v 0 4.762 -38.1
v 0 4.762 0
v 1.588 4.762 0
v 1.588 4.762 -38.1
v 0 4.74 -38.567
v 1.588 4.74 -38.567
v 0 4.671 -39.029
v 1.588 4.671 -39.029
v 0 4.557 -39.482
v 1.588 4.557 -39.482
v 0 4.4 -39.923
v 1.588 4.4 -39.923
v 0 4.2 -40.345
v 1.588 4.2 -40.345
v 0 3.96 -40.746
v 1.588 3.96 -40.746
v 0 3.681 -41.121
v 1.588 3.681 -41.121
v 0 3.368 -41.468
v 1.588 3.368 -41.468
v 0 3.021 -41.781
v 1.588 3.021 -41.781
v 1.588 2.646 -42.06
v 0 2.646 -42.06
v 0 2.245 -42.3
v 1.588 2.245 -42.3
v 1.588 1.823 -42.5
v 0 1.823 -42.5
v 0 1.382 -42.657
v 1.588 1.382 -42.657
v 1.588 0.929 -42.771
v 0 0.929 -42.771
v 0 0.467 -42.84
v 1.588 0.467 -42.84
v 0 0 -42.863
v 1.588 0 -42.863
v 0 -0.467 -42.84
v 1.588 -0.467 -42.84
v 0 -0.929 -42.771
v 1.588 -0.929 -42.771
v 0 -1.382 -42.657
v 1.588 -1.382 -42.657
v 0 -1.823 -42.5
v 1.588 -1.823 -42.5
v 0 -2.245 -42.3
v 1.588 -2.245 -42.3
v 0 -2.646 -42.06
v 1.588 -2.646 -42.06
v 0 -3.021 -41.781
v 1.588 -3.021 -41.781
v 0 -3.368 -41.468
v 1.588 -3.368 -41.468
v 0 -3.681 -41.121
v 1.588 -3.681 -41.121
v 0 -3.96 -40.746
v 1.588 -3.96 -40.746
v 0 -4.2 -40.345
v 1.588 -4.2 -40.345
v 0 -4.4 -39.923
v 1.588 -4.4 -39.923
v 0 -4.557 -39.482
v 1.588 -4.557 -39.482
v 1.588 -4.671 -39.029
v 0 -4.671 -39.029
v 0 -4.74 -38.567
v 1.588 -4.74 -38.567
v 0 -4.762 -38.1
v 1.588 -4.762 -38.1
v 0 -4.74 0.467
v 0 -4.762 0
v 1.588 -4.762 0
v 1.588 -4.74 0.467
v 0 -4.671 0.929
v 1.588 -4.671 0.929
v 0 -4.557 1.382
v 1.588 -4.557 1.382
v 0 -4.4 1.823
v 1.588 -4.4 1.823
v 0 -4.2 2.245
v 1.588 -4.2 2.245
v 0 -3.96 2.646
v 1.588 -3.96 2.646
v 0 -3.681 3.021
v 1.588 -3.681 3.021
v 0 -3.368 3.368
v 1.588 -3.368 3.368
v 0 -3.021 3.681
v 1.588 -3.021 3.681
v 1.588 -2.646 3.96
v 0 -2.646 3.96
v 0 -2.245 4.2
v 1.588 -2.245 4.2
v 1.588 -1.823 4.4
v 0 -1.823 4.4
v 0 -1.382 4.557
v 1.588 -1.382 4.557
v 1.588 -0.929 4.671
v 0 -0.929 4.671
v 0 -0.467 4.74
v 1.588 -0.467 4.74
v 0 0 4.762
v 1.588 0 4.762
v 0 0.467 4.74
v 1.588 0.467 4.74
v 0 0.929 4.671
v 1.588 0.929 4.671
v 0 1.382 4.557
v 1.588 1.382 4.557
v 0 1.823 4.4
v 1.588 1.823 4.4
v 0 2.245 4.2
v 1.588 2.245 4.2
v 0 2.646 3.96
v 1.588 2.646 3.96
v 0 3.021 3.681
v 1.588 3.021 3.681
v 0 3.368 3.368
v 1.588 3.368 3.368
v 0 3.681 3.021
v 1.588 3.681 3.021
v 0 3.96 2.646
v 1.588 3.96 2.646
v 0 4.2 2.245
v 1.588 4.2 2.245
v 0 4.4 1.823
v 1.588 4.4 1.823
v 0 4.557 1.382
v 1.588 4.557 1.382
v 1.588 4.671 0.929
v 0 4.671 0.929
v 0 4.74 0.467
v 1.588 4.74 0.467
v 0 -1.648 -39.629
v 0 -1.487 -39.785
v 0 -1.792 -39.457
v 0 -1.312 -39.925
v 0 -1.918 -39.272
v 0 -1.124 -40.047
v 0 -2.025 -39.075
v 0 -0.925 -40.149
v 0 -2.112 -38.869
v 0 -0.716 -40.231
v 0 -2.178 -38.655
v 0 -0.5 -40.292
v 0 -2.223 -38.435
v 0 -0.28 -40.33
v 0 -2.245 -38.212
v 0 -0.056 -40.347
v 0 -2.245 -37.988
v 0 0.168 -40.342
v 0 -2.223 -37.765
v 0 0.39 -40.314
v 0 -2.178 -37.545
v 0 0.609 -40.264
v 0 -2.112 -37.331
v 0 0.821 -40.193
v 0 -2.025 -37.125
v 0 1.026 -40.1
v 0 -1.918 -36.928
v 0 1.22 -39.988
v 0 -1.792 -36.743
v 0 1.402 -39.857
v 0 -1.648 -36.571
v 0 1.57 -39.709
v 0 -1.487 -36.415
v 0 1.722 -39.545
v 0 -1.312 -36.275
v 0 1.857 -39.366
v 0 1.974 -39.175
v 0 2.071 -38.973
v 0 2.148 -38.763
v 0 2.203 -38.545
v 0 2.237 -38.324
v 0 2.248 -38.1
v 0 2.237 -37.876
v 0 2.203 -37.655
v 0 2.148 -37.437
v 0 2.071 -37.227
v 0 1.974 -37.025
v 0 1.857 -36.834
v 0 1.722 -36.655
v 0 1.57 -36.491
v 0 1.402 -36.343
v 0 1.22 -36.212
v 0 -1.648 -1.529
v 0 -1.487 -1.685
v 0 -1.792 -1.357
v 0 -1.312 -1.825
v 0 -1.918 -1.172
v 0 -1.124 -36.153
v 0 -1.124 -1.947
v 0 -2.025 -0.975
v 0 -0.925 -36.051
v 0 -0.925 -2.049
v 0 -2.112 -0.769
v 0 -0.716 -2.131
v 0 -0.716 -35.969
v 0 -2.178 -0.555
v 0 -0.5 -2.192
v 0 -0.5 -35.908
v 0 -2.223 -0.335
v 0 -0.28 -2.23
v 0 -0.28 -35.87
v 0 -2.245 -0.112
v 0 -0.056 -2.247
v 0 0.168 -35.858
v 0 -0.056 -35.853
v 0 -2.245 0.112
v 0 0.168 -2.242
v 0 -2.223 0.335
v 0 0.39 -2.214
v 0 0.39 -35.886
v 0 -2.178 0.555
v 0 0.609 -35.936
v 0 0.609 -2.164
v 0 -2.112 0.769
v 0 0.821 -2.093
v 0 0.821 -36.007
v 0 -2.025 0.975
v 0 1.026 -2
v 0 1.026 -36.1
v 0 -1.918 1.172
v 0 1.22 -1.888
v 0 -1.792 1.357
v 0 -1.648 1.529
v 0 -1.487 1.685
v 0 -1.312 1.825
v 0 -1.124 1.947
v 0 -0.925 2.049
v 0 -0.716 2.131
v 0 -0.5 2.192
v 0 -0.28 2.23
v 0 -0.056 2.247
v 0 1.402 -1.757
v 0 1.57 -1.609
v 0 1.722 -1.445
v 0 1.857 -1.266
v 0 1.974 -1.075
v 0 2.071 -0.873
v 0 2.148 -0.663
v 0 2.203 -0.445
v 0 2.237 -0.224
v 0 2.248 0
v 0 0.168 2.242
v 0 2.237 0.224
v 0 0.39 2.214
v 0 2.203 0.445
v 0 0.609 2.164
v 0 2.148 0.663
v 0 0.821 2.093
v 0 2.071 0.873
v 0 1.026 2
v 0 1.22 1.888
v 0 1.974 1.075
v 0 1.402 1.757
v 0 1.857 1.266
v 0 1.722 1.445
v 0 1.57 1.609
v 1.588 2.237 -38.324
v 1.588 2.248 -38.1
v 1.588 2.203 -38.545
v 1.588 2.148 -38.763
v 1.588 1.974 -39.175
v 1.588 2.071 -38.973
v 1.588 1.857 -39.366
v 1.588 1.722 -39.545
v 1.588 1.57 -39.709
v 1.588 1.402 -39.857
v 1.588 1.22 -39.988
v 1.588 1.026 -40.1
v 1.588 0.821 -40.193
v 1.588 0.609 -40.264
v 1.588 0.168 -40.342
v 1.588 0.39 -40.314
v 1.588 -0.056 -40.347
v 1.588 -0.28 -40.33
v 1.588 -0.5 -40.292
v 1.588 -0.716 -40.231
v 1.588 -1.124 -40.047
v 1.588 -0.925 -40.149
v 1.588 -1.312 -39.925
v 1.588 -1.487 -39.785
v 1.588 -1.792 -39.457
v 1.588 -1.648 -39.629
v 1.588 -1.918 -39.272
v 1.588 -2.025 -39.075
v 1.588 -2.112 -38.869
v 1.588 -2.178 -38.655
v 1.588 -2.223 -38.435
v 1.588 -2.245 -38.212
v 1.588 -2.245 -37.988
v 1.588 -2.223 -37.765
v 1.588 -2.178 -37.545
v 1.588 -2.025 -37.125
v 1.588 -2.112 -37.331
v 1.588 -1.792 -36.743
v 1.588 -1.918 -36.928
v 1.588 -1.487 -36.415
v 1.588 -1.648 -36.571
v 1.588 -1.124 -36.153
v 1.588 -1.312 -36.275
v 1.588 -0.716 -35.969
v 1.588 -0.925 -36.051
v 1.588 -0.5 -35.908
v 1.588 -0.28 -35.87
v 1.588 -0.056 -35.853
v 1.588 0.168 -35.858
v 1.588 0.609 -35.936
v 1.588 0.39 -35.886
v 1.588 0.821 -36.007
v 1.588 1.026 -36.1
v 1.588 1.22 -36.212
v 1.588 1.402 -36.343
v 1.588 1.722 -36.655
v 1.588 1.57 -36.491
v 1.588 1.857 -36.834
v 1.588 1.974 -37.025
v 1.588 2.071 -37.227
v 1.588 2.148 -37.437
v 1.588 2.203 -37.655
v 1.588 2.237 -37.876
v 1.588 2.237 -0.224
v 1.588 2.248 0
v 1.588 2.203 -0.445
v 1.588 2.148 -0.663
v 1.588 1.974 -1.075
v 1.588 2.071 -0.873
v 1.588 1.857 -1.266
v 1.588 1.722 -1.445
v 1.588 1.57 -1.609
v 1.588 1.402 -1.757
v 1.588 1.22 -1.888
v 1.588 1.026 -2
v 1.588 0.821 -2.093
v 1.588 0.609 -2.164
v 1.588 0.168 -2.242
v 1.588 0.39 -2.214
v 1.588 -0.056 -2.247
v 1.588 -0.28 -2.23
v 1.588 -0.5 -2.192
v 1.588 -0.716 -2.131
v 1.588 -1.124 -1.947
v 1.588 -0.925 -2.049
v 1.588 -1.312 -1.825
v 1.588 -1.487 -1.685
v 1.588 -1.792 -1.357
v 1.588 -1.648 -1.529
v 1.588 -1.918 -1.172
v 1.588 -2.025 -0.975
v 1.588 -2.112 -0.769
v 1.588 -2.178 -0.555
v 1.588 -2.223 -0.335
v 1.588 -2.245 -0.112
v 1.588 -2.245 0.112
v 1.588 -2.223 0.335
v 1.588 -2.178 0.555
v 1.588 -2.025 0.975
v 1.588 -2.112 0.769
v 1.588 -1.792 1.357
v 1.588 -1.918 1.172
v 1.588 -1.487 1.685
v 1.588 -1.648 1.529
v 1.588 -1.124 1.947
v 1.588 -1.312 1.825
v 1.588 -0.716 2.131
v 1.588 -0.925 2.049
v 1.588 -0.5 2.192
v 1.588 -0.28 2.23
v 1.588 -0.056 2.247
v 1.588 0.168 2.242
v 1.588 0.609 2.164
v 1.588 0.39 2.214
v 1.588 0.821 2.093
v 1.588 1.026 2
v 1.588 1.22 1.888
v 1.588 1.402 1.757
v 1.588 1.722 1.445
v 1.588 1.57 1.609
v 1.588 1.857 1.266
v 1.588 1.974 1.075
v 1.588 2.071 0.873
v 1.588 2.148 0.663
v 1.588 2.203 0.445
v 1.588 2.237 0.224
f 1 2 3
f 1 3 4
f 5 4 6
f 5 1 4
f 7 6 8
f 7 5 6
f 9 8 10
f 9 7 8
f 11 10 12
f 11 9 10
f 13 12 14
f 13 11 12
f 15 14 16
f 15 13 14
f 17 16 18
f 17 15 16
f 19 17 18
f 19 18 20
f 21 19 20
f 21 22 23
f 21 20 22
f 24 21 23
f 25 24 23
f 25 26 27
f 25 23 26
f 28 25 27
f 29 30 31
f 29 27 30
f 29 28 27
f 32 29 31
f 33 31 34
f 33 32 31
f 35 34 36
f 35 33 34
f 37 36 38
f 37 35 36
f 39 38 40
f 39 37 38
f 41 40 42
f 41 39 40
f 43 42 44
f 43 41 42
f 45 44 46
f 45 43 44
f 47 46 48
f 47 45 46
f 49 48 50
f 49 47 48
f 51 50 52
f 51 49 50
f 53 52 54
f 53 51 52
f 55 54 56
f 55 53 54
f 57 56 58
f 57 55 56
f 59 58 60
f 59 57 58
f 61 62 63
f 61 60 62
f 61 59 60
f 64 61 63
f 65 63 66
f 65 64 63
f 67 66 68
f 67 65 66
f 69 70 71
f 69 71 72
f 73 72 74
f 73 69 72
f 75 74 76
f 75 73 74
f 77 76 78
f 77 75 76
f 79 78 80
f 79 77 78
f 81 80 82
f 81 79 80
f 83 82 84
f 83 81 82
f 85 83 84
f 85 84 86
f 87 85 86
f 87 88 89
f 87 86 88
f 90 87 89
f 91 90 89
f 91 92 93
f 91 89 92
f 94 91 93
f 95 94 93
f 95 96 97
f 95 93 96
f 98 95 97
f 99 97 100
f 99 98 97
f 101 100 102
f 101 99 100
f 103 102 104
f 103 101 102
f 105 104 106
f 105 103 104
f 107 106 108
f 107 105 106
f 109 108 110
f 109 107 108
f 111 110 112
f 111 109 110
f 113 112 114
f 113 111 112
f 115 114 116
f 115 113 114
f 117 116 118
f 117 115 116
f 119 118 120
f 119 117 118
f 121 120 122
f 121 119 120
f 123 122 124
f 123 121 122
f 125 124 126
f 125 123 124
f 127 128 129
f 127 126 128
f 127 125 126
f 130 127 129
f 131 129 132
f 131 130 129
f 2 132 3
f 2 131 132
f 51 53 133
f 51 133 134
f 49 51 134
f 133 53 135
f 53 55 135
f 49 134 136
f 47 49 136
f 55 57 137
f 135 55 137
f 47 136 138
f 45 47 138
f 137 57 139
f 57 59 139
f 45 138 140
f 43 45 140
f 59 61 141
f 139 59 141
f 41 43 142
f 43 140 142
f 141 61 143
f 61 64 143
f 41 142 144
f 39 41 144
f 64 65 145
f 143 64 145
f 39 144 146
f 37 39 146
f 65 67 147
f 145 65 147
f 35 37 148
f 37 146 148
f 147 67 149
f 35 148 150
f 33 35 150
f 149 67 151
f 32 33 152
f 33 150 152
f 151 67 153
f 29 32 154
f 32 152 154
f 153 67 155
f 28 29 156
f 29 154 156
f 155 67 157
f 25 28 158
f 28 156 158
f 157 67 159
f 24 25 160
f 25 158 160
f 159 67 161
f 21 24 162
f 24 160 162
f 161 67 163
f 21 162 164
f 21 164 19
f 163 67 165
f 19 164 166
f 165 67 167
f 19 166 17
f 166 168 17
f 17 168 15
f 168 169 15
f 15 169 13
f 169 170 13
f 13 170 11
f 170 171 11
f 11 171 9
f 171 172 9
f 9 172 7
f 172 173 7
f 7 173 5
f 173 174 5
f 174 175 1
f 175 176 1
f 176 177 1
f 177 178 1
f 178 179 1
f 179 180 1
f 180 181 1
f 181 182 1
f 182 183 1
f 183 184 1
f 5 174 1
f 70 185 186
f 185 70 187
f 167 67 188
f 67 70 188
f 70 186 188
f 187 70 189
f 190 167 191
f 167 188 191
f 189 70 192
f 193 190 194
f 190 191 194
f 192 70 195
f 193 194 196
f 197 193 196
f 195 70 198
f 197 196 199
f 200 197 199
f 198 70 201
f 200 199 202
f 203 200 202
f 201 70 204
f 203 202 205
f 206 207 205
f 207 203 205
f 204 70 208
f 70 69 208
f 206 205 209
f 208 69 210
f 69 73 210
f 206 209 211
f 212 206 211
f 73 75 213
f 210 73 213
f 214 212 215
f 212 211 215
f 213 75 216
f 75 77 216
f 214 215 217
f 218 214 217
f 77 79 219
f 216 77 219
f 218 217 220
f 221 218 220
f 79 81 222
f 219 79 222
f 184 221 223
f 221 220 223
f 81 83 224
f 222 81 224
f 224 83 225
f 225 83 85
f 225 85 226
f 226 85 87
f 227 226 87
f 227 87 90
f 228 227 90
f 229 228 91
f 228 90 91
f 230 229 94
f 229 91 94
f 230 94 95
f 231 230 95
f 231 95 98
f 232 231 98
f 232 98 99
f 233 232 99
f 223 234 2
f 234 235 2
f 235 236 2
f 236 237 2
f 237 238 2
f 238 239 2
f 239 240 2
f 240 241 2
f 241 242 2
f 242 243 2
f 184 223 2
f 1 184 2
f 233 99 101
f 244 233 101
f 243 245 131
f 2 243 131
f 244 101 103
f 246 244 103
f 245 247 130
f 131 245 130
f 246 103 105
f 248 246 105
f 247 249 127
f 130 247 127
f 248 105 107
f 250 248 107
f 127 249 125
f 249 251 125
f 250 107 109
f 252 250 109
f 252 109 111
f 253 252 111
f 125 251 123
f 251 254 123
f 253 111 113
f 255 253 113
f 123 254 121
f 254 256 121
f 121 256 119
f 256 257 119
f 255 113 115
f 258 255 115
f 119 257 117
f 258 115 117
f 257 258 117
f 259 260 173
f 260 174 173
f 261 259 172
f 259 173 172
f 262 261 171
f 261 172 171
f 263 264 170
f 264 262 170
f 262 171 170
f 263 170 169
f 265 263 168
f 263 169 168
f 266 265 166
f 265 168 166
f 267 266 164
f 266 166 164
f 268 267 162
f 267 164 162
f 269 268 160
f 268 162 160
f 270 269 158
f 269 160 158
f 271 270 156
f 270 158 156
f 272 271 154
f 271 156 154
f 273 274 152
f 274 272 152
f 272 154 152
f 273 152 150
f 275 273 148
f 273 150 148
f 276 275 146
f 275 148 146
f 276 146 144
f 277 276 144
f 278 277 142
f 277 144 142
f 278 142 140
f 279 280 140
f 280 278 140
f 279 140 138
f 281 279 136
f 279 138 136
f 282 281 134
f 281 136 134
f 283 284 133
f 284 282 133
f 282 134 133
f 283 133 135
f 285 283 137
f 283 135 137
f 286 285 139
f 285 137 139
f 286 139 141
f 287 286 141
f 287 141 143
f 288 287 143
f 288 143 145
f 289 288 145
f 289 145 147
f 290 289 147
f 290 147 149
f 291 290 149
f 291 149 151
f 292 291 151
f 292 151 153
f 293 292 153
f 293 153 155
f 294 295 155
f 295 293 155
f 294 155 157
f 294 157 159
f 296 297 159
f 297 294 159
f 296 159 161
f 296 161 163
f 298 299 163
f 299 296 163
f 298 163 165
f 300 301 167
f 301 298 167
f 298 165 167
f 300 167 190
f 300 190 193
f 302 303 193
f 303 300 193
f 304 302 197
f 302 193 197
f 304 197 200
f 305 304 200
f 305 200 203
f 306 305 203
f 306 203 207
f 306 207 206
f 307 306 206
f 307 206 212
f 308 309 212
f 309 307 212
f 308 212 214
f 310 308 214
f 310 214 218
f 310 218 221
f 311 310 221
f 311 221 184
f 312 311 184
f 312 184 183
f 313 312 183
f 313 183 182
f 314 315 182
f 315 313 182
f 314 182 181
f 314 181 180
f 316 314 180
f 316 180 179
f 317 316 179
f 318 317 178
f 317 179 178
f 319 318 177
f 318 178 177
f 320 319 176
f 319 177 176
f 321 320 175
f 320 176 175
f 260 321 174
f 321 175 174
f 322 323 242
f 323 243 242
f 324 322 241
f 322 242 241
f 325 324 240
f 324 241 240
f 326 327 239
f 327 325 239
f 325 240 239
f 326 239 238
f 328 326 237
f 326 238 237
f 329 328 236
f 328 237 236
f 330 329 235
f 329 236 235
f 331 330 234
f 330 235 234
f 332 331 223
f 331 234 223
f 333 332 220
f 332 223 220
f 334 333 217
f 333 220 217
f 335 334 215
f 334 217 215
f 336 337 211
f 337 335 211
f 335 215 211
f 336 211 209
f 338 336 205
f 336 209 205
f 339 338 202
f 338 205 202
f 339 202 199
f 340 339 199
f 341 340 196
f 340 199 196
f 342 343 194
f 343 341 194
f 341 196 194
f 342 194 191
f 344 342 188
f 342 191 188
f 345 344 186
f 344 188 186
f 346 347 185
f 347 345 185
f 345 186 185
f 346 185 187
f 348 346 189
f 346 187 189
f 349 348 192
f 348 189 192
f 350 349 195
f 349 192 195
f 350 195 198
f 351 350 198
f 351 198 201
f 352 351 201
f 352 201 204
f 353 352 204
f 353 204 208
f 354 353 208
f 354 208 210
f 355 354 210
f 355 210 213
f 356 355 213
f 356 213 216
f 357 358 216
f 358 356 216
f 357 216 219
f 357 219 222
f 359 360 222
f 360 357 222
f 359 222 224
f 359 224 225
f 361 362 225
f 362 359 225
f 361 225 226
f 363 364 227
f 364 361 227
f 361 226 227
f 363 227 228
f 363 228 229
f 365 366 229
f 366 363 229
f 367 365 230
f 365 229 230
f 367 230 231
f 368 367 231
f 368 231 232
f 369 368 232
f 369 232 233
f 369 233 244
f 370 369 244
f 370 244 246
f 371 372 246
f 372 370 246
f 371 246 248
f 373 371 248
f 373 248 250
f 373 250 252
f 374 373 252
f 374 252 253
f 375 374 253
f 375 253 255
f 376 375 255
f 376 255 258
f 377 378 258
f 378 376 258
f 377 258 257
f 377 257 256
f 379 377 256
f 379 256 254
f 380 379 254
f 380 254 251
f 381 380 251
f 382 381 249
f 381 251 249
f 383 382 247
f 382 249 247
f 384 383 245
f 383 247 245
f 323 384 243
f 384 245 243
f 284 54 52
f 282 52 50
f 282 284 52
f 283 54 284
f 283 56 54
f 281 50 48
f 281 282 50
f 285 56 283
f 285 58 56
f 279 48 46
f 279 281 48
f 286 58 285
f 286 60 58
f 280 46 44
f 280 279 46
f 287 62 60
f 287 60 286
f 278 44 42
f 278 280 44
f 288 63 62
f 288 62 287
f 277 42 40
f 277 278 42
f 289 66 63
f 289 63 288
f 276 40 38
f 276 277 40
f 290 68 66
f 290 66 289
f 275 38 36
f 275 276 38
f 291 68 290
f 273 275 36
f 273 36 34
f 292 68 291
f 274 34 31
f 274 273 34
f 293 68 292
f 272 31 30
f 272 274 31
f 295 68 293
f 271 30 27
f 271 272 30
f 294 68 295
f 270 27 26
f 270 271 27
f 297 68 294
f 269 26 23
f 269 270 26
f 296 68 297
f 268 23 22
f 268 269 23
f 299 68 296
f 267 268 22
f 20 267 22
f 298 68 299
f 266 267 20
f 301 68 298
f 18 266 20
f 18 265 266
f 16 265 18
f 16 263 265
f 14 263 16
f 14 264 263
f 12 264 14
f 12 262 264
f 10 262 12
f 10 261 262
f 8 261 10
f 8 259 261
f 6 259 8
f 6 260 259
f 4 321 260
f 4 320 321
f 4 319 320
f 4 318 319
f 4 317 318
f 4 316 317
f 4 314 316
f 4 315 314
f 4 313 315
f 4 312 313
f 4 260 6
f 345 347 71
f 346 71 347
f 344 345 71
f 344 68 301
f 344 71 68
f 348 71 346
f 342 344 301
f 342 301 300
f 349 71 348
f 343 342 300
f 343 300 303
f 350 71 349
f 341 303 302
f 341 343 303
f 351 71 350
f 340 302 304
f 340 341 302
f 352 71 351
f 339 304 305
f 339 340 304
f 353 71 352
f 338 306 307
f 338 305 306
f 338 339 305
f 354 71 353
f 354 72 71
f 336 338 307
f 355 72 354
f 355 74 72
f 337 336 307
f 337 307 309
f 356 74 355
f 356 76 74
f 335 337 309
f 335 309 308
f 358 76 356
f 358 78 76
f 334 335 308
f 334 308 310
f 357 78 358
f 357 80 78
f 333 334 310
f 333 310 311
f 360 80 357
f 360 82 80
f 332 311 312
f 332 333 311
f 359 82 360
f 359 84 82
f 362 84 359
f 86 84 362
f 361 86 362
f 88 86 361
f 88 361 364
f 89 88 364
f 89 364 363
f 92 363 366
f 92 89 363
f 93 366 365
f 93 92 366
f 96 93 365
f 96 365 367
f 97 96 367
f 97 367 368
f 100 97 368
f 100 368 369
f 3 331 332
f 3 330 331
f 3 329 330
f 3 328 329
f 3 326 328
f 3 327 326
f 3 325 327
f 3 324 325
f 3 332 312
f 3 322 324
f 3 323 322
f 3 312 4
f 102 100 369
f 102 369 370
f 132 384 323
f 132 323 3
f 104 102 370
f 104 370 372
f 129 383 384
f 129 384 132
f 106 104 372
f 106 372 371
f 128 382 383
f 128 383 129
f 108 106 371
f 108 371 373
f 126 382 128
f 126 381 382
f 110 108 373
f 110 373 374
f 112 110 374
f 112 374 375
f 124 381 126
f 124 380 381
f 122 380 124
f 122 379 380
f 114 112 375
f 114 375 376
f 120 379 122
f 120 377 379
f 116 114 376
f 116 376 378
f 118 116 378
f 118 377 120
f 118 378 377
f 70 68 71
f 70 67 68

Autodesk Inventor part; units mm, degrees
ref_plane "YZ Plane" through (0, 0, 0) normal (1, 0, 0) x (0, 1, 0)
ref_plane "XZ Plane" through (0, 0, 0) normal (0, 1, 0) x (-1, 0, 0)
ref_plane "XY Plane" through (0, 0, 0) normal (0, 0, 1) x (1, 0, 0)
sketch "Sketch1" plane through (0, 0, 0) normal (1, 0, 0) x (0, 1, 0)
  circle A0 centre (0, 0) radius 2.2479
  circle A1 centre (0, -38.1) radius 2.2479
  arc A2 (4.7625, 0) -> (-4.7625, 0) centre (0, 0) ccw
  arc A3 (-4.7625, -38.1) -> (4.7625, -38.1) centre (0, -38.1) ccw
  line L0 (4.7625, 0) -> (4.7625, -38.1)
  line L1 (-4.7625, -38.1) -> (-4.7625, 0)
  dimension "d0" = 4.4958
  dimension "d1" = 4.4958
  dimension "d2" = 9.525
  dimension "d3" = 9.525
extrude "Extrusion1" add sketch "Sketch1" along normal blind 1.5875
properties part number "Motor Gearbox Gusset" material "Acetal Resin, White"
